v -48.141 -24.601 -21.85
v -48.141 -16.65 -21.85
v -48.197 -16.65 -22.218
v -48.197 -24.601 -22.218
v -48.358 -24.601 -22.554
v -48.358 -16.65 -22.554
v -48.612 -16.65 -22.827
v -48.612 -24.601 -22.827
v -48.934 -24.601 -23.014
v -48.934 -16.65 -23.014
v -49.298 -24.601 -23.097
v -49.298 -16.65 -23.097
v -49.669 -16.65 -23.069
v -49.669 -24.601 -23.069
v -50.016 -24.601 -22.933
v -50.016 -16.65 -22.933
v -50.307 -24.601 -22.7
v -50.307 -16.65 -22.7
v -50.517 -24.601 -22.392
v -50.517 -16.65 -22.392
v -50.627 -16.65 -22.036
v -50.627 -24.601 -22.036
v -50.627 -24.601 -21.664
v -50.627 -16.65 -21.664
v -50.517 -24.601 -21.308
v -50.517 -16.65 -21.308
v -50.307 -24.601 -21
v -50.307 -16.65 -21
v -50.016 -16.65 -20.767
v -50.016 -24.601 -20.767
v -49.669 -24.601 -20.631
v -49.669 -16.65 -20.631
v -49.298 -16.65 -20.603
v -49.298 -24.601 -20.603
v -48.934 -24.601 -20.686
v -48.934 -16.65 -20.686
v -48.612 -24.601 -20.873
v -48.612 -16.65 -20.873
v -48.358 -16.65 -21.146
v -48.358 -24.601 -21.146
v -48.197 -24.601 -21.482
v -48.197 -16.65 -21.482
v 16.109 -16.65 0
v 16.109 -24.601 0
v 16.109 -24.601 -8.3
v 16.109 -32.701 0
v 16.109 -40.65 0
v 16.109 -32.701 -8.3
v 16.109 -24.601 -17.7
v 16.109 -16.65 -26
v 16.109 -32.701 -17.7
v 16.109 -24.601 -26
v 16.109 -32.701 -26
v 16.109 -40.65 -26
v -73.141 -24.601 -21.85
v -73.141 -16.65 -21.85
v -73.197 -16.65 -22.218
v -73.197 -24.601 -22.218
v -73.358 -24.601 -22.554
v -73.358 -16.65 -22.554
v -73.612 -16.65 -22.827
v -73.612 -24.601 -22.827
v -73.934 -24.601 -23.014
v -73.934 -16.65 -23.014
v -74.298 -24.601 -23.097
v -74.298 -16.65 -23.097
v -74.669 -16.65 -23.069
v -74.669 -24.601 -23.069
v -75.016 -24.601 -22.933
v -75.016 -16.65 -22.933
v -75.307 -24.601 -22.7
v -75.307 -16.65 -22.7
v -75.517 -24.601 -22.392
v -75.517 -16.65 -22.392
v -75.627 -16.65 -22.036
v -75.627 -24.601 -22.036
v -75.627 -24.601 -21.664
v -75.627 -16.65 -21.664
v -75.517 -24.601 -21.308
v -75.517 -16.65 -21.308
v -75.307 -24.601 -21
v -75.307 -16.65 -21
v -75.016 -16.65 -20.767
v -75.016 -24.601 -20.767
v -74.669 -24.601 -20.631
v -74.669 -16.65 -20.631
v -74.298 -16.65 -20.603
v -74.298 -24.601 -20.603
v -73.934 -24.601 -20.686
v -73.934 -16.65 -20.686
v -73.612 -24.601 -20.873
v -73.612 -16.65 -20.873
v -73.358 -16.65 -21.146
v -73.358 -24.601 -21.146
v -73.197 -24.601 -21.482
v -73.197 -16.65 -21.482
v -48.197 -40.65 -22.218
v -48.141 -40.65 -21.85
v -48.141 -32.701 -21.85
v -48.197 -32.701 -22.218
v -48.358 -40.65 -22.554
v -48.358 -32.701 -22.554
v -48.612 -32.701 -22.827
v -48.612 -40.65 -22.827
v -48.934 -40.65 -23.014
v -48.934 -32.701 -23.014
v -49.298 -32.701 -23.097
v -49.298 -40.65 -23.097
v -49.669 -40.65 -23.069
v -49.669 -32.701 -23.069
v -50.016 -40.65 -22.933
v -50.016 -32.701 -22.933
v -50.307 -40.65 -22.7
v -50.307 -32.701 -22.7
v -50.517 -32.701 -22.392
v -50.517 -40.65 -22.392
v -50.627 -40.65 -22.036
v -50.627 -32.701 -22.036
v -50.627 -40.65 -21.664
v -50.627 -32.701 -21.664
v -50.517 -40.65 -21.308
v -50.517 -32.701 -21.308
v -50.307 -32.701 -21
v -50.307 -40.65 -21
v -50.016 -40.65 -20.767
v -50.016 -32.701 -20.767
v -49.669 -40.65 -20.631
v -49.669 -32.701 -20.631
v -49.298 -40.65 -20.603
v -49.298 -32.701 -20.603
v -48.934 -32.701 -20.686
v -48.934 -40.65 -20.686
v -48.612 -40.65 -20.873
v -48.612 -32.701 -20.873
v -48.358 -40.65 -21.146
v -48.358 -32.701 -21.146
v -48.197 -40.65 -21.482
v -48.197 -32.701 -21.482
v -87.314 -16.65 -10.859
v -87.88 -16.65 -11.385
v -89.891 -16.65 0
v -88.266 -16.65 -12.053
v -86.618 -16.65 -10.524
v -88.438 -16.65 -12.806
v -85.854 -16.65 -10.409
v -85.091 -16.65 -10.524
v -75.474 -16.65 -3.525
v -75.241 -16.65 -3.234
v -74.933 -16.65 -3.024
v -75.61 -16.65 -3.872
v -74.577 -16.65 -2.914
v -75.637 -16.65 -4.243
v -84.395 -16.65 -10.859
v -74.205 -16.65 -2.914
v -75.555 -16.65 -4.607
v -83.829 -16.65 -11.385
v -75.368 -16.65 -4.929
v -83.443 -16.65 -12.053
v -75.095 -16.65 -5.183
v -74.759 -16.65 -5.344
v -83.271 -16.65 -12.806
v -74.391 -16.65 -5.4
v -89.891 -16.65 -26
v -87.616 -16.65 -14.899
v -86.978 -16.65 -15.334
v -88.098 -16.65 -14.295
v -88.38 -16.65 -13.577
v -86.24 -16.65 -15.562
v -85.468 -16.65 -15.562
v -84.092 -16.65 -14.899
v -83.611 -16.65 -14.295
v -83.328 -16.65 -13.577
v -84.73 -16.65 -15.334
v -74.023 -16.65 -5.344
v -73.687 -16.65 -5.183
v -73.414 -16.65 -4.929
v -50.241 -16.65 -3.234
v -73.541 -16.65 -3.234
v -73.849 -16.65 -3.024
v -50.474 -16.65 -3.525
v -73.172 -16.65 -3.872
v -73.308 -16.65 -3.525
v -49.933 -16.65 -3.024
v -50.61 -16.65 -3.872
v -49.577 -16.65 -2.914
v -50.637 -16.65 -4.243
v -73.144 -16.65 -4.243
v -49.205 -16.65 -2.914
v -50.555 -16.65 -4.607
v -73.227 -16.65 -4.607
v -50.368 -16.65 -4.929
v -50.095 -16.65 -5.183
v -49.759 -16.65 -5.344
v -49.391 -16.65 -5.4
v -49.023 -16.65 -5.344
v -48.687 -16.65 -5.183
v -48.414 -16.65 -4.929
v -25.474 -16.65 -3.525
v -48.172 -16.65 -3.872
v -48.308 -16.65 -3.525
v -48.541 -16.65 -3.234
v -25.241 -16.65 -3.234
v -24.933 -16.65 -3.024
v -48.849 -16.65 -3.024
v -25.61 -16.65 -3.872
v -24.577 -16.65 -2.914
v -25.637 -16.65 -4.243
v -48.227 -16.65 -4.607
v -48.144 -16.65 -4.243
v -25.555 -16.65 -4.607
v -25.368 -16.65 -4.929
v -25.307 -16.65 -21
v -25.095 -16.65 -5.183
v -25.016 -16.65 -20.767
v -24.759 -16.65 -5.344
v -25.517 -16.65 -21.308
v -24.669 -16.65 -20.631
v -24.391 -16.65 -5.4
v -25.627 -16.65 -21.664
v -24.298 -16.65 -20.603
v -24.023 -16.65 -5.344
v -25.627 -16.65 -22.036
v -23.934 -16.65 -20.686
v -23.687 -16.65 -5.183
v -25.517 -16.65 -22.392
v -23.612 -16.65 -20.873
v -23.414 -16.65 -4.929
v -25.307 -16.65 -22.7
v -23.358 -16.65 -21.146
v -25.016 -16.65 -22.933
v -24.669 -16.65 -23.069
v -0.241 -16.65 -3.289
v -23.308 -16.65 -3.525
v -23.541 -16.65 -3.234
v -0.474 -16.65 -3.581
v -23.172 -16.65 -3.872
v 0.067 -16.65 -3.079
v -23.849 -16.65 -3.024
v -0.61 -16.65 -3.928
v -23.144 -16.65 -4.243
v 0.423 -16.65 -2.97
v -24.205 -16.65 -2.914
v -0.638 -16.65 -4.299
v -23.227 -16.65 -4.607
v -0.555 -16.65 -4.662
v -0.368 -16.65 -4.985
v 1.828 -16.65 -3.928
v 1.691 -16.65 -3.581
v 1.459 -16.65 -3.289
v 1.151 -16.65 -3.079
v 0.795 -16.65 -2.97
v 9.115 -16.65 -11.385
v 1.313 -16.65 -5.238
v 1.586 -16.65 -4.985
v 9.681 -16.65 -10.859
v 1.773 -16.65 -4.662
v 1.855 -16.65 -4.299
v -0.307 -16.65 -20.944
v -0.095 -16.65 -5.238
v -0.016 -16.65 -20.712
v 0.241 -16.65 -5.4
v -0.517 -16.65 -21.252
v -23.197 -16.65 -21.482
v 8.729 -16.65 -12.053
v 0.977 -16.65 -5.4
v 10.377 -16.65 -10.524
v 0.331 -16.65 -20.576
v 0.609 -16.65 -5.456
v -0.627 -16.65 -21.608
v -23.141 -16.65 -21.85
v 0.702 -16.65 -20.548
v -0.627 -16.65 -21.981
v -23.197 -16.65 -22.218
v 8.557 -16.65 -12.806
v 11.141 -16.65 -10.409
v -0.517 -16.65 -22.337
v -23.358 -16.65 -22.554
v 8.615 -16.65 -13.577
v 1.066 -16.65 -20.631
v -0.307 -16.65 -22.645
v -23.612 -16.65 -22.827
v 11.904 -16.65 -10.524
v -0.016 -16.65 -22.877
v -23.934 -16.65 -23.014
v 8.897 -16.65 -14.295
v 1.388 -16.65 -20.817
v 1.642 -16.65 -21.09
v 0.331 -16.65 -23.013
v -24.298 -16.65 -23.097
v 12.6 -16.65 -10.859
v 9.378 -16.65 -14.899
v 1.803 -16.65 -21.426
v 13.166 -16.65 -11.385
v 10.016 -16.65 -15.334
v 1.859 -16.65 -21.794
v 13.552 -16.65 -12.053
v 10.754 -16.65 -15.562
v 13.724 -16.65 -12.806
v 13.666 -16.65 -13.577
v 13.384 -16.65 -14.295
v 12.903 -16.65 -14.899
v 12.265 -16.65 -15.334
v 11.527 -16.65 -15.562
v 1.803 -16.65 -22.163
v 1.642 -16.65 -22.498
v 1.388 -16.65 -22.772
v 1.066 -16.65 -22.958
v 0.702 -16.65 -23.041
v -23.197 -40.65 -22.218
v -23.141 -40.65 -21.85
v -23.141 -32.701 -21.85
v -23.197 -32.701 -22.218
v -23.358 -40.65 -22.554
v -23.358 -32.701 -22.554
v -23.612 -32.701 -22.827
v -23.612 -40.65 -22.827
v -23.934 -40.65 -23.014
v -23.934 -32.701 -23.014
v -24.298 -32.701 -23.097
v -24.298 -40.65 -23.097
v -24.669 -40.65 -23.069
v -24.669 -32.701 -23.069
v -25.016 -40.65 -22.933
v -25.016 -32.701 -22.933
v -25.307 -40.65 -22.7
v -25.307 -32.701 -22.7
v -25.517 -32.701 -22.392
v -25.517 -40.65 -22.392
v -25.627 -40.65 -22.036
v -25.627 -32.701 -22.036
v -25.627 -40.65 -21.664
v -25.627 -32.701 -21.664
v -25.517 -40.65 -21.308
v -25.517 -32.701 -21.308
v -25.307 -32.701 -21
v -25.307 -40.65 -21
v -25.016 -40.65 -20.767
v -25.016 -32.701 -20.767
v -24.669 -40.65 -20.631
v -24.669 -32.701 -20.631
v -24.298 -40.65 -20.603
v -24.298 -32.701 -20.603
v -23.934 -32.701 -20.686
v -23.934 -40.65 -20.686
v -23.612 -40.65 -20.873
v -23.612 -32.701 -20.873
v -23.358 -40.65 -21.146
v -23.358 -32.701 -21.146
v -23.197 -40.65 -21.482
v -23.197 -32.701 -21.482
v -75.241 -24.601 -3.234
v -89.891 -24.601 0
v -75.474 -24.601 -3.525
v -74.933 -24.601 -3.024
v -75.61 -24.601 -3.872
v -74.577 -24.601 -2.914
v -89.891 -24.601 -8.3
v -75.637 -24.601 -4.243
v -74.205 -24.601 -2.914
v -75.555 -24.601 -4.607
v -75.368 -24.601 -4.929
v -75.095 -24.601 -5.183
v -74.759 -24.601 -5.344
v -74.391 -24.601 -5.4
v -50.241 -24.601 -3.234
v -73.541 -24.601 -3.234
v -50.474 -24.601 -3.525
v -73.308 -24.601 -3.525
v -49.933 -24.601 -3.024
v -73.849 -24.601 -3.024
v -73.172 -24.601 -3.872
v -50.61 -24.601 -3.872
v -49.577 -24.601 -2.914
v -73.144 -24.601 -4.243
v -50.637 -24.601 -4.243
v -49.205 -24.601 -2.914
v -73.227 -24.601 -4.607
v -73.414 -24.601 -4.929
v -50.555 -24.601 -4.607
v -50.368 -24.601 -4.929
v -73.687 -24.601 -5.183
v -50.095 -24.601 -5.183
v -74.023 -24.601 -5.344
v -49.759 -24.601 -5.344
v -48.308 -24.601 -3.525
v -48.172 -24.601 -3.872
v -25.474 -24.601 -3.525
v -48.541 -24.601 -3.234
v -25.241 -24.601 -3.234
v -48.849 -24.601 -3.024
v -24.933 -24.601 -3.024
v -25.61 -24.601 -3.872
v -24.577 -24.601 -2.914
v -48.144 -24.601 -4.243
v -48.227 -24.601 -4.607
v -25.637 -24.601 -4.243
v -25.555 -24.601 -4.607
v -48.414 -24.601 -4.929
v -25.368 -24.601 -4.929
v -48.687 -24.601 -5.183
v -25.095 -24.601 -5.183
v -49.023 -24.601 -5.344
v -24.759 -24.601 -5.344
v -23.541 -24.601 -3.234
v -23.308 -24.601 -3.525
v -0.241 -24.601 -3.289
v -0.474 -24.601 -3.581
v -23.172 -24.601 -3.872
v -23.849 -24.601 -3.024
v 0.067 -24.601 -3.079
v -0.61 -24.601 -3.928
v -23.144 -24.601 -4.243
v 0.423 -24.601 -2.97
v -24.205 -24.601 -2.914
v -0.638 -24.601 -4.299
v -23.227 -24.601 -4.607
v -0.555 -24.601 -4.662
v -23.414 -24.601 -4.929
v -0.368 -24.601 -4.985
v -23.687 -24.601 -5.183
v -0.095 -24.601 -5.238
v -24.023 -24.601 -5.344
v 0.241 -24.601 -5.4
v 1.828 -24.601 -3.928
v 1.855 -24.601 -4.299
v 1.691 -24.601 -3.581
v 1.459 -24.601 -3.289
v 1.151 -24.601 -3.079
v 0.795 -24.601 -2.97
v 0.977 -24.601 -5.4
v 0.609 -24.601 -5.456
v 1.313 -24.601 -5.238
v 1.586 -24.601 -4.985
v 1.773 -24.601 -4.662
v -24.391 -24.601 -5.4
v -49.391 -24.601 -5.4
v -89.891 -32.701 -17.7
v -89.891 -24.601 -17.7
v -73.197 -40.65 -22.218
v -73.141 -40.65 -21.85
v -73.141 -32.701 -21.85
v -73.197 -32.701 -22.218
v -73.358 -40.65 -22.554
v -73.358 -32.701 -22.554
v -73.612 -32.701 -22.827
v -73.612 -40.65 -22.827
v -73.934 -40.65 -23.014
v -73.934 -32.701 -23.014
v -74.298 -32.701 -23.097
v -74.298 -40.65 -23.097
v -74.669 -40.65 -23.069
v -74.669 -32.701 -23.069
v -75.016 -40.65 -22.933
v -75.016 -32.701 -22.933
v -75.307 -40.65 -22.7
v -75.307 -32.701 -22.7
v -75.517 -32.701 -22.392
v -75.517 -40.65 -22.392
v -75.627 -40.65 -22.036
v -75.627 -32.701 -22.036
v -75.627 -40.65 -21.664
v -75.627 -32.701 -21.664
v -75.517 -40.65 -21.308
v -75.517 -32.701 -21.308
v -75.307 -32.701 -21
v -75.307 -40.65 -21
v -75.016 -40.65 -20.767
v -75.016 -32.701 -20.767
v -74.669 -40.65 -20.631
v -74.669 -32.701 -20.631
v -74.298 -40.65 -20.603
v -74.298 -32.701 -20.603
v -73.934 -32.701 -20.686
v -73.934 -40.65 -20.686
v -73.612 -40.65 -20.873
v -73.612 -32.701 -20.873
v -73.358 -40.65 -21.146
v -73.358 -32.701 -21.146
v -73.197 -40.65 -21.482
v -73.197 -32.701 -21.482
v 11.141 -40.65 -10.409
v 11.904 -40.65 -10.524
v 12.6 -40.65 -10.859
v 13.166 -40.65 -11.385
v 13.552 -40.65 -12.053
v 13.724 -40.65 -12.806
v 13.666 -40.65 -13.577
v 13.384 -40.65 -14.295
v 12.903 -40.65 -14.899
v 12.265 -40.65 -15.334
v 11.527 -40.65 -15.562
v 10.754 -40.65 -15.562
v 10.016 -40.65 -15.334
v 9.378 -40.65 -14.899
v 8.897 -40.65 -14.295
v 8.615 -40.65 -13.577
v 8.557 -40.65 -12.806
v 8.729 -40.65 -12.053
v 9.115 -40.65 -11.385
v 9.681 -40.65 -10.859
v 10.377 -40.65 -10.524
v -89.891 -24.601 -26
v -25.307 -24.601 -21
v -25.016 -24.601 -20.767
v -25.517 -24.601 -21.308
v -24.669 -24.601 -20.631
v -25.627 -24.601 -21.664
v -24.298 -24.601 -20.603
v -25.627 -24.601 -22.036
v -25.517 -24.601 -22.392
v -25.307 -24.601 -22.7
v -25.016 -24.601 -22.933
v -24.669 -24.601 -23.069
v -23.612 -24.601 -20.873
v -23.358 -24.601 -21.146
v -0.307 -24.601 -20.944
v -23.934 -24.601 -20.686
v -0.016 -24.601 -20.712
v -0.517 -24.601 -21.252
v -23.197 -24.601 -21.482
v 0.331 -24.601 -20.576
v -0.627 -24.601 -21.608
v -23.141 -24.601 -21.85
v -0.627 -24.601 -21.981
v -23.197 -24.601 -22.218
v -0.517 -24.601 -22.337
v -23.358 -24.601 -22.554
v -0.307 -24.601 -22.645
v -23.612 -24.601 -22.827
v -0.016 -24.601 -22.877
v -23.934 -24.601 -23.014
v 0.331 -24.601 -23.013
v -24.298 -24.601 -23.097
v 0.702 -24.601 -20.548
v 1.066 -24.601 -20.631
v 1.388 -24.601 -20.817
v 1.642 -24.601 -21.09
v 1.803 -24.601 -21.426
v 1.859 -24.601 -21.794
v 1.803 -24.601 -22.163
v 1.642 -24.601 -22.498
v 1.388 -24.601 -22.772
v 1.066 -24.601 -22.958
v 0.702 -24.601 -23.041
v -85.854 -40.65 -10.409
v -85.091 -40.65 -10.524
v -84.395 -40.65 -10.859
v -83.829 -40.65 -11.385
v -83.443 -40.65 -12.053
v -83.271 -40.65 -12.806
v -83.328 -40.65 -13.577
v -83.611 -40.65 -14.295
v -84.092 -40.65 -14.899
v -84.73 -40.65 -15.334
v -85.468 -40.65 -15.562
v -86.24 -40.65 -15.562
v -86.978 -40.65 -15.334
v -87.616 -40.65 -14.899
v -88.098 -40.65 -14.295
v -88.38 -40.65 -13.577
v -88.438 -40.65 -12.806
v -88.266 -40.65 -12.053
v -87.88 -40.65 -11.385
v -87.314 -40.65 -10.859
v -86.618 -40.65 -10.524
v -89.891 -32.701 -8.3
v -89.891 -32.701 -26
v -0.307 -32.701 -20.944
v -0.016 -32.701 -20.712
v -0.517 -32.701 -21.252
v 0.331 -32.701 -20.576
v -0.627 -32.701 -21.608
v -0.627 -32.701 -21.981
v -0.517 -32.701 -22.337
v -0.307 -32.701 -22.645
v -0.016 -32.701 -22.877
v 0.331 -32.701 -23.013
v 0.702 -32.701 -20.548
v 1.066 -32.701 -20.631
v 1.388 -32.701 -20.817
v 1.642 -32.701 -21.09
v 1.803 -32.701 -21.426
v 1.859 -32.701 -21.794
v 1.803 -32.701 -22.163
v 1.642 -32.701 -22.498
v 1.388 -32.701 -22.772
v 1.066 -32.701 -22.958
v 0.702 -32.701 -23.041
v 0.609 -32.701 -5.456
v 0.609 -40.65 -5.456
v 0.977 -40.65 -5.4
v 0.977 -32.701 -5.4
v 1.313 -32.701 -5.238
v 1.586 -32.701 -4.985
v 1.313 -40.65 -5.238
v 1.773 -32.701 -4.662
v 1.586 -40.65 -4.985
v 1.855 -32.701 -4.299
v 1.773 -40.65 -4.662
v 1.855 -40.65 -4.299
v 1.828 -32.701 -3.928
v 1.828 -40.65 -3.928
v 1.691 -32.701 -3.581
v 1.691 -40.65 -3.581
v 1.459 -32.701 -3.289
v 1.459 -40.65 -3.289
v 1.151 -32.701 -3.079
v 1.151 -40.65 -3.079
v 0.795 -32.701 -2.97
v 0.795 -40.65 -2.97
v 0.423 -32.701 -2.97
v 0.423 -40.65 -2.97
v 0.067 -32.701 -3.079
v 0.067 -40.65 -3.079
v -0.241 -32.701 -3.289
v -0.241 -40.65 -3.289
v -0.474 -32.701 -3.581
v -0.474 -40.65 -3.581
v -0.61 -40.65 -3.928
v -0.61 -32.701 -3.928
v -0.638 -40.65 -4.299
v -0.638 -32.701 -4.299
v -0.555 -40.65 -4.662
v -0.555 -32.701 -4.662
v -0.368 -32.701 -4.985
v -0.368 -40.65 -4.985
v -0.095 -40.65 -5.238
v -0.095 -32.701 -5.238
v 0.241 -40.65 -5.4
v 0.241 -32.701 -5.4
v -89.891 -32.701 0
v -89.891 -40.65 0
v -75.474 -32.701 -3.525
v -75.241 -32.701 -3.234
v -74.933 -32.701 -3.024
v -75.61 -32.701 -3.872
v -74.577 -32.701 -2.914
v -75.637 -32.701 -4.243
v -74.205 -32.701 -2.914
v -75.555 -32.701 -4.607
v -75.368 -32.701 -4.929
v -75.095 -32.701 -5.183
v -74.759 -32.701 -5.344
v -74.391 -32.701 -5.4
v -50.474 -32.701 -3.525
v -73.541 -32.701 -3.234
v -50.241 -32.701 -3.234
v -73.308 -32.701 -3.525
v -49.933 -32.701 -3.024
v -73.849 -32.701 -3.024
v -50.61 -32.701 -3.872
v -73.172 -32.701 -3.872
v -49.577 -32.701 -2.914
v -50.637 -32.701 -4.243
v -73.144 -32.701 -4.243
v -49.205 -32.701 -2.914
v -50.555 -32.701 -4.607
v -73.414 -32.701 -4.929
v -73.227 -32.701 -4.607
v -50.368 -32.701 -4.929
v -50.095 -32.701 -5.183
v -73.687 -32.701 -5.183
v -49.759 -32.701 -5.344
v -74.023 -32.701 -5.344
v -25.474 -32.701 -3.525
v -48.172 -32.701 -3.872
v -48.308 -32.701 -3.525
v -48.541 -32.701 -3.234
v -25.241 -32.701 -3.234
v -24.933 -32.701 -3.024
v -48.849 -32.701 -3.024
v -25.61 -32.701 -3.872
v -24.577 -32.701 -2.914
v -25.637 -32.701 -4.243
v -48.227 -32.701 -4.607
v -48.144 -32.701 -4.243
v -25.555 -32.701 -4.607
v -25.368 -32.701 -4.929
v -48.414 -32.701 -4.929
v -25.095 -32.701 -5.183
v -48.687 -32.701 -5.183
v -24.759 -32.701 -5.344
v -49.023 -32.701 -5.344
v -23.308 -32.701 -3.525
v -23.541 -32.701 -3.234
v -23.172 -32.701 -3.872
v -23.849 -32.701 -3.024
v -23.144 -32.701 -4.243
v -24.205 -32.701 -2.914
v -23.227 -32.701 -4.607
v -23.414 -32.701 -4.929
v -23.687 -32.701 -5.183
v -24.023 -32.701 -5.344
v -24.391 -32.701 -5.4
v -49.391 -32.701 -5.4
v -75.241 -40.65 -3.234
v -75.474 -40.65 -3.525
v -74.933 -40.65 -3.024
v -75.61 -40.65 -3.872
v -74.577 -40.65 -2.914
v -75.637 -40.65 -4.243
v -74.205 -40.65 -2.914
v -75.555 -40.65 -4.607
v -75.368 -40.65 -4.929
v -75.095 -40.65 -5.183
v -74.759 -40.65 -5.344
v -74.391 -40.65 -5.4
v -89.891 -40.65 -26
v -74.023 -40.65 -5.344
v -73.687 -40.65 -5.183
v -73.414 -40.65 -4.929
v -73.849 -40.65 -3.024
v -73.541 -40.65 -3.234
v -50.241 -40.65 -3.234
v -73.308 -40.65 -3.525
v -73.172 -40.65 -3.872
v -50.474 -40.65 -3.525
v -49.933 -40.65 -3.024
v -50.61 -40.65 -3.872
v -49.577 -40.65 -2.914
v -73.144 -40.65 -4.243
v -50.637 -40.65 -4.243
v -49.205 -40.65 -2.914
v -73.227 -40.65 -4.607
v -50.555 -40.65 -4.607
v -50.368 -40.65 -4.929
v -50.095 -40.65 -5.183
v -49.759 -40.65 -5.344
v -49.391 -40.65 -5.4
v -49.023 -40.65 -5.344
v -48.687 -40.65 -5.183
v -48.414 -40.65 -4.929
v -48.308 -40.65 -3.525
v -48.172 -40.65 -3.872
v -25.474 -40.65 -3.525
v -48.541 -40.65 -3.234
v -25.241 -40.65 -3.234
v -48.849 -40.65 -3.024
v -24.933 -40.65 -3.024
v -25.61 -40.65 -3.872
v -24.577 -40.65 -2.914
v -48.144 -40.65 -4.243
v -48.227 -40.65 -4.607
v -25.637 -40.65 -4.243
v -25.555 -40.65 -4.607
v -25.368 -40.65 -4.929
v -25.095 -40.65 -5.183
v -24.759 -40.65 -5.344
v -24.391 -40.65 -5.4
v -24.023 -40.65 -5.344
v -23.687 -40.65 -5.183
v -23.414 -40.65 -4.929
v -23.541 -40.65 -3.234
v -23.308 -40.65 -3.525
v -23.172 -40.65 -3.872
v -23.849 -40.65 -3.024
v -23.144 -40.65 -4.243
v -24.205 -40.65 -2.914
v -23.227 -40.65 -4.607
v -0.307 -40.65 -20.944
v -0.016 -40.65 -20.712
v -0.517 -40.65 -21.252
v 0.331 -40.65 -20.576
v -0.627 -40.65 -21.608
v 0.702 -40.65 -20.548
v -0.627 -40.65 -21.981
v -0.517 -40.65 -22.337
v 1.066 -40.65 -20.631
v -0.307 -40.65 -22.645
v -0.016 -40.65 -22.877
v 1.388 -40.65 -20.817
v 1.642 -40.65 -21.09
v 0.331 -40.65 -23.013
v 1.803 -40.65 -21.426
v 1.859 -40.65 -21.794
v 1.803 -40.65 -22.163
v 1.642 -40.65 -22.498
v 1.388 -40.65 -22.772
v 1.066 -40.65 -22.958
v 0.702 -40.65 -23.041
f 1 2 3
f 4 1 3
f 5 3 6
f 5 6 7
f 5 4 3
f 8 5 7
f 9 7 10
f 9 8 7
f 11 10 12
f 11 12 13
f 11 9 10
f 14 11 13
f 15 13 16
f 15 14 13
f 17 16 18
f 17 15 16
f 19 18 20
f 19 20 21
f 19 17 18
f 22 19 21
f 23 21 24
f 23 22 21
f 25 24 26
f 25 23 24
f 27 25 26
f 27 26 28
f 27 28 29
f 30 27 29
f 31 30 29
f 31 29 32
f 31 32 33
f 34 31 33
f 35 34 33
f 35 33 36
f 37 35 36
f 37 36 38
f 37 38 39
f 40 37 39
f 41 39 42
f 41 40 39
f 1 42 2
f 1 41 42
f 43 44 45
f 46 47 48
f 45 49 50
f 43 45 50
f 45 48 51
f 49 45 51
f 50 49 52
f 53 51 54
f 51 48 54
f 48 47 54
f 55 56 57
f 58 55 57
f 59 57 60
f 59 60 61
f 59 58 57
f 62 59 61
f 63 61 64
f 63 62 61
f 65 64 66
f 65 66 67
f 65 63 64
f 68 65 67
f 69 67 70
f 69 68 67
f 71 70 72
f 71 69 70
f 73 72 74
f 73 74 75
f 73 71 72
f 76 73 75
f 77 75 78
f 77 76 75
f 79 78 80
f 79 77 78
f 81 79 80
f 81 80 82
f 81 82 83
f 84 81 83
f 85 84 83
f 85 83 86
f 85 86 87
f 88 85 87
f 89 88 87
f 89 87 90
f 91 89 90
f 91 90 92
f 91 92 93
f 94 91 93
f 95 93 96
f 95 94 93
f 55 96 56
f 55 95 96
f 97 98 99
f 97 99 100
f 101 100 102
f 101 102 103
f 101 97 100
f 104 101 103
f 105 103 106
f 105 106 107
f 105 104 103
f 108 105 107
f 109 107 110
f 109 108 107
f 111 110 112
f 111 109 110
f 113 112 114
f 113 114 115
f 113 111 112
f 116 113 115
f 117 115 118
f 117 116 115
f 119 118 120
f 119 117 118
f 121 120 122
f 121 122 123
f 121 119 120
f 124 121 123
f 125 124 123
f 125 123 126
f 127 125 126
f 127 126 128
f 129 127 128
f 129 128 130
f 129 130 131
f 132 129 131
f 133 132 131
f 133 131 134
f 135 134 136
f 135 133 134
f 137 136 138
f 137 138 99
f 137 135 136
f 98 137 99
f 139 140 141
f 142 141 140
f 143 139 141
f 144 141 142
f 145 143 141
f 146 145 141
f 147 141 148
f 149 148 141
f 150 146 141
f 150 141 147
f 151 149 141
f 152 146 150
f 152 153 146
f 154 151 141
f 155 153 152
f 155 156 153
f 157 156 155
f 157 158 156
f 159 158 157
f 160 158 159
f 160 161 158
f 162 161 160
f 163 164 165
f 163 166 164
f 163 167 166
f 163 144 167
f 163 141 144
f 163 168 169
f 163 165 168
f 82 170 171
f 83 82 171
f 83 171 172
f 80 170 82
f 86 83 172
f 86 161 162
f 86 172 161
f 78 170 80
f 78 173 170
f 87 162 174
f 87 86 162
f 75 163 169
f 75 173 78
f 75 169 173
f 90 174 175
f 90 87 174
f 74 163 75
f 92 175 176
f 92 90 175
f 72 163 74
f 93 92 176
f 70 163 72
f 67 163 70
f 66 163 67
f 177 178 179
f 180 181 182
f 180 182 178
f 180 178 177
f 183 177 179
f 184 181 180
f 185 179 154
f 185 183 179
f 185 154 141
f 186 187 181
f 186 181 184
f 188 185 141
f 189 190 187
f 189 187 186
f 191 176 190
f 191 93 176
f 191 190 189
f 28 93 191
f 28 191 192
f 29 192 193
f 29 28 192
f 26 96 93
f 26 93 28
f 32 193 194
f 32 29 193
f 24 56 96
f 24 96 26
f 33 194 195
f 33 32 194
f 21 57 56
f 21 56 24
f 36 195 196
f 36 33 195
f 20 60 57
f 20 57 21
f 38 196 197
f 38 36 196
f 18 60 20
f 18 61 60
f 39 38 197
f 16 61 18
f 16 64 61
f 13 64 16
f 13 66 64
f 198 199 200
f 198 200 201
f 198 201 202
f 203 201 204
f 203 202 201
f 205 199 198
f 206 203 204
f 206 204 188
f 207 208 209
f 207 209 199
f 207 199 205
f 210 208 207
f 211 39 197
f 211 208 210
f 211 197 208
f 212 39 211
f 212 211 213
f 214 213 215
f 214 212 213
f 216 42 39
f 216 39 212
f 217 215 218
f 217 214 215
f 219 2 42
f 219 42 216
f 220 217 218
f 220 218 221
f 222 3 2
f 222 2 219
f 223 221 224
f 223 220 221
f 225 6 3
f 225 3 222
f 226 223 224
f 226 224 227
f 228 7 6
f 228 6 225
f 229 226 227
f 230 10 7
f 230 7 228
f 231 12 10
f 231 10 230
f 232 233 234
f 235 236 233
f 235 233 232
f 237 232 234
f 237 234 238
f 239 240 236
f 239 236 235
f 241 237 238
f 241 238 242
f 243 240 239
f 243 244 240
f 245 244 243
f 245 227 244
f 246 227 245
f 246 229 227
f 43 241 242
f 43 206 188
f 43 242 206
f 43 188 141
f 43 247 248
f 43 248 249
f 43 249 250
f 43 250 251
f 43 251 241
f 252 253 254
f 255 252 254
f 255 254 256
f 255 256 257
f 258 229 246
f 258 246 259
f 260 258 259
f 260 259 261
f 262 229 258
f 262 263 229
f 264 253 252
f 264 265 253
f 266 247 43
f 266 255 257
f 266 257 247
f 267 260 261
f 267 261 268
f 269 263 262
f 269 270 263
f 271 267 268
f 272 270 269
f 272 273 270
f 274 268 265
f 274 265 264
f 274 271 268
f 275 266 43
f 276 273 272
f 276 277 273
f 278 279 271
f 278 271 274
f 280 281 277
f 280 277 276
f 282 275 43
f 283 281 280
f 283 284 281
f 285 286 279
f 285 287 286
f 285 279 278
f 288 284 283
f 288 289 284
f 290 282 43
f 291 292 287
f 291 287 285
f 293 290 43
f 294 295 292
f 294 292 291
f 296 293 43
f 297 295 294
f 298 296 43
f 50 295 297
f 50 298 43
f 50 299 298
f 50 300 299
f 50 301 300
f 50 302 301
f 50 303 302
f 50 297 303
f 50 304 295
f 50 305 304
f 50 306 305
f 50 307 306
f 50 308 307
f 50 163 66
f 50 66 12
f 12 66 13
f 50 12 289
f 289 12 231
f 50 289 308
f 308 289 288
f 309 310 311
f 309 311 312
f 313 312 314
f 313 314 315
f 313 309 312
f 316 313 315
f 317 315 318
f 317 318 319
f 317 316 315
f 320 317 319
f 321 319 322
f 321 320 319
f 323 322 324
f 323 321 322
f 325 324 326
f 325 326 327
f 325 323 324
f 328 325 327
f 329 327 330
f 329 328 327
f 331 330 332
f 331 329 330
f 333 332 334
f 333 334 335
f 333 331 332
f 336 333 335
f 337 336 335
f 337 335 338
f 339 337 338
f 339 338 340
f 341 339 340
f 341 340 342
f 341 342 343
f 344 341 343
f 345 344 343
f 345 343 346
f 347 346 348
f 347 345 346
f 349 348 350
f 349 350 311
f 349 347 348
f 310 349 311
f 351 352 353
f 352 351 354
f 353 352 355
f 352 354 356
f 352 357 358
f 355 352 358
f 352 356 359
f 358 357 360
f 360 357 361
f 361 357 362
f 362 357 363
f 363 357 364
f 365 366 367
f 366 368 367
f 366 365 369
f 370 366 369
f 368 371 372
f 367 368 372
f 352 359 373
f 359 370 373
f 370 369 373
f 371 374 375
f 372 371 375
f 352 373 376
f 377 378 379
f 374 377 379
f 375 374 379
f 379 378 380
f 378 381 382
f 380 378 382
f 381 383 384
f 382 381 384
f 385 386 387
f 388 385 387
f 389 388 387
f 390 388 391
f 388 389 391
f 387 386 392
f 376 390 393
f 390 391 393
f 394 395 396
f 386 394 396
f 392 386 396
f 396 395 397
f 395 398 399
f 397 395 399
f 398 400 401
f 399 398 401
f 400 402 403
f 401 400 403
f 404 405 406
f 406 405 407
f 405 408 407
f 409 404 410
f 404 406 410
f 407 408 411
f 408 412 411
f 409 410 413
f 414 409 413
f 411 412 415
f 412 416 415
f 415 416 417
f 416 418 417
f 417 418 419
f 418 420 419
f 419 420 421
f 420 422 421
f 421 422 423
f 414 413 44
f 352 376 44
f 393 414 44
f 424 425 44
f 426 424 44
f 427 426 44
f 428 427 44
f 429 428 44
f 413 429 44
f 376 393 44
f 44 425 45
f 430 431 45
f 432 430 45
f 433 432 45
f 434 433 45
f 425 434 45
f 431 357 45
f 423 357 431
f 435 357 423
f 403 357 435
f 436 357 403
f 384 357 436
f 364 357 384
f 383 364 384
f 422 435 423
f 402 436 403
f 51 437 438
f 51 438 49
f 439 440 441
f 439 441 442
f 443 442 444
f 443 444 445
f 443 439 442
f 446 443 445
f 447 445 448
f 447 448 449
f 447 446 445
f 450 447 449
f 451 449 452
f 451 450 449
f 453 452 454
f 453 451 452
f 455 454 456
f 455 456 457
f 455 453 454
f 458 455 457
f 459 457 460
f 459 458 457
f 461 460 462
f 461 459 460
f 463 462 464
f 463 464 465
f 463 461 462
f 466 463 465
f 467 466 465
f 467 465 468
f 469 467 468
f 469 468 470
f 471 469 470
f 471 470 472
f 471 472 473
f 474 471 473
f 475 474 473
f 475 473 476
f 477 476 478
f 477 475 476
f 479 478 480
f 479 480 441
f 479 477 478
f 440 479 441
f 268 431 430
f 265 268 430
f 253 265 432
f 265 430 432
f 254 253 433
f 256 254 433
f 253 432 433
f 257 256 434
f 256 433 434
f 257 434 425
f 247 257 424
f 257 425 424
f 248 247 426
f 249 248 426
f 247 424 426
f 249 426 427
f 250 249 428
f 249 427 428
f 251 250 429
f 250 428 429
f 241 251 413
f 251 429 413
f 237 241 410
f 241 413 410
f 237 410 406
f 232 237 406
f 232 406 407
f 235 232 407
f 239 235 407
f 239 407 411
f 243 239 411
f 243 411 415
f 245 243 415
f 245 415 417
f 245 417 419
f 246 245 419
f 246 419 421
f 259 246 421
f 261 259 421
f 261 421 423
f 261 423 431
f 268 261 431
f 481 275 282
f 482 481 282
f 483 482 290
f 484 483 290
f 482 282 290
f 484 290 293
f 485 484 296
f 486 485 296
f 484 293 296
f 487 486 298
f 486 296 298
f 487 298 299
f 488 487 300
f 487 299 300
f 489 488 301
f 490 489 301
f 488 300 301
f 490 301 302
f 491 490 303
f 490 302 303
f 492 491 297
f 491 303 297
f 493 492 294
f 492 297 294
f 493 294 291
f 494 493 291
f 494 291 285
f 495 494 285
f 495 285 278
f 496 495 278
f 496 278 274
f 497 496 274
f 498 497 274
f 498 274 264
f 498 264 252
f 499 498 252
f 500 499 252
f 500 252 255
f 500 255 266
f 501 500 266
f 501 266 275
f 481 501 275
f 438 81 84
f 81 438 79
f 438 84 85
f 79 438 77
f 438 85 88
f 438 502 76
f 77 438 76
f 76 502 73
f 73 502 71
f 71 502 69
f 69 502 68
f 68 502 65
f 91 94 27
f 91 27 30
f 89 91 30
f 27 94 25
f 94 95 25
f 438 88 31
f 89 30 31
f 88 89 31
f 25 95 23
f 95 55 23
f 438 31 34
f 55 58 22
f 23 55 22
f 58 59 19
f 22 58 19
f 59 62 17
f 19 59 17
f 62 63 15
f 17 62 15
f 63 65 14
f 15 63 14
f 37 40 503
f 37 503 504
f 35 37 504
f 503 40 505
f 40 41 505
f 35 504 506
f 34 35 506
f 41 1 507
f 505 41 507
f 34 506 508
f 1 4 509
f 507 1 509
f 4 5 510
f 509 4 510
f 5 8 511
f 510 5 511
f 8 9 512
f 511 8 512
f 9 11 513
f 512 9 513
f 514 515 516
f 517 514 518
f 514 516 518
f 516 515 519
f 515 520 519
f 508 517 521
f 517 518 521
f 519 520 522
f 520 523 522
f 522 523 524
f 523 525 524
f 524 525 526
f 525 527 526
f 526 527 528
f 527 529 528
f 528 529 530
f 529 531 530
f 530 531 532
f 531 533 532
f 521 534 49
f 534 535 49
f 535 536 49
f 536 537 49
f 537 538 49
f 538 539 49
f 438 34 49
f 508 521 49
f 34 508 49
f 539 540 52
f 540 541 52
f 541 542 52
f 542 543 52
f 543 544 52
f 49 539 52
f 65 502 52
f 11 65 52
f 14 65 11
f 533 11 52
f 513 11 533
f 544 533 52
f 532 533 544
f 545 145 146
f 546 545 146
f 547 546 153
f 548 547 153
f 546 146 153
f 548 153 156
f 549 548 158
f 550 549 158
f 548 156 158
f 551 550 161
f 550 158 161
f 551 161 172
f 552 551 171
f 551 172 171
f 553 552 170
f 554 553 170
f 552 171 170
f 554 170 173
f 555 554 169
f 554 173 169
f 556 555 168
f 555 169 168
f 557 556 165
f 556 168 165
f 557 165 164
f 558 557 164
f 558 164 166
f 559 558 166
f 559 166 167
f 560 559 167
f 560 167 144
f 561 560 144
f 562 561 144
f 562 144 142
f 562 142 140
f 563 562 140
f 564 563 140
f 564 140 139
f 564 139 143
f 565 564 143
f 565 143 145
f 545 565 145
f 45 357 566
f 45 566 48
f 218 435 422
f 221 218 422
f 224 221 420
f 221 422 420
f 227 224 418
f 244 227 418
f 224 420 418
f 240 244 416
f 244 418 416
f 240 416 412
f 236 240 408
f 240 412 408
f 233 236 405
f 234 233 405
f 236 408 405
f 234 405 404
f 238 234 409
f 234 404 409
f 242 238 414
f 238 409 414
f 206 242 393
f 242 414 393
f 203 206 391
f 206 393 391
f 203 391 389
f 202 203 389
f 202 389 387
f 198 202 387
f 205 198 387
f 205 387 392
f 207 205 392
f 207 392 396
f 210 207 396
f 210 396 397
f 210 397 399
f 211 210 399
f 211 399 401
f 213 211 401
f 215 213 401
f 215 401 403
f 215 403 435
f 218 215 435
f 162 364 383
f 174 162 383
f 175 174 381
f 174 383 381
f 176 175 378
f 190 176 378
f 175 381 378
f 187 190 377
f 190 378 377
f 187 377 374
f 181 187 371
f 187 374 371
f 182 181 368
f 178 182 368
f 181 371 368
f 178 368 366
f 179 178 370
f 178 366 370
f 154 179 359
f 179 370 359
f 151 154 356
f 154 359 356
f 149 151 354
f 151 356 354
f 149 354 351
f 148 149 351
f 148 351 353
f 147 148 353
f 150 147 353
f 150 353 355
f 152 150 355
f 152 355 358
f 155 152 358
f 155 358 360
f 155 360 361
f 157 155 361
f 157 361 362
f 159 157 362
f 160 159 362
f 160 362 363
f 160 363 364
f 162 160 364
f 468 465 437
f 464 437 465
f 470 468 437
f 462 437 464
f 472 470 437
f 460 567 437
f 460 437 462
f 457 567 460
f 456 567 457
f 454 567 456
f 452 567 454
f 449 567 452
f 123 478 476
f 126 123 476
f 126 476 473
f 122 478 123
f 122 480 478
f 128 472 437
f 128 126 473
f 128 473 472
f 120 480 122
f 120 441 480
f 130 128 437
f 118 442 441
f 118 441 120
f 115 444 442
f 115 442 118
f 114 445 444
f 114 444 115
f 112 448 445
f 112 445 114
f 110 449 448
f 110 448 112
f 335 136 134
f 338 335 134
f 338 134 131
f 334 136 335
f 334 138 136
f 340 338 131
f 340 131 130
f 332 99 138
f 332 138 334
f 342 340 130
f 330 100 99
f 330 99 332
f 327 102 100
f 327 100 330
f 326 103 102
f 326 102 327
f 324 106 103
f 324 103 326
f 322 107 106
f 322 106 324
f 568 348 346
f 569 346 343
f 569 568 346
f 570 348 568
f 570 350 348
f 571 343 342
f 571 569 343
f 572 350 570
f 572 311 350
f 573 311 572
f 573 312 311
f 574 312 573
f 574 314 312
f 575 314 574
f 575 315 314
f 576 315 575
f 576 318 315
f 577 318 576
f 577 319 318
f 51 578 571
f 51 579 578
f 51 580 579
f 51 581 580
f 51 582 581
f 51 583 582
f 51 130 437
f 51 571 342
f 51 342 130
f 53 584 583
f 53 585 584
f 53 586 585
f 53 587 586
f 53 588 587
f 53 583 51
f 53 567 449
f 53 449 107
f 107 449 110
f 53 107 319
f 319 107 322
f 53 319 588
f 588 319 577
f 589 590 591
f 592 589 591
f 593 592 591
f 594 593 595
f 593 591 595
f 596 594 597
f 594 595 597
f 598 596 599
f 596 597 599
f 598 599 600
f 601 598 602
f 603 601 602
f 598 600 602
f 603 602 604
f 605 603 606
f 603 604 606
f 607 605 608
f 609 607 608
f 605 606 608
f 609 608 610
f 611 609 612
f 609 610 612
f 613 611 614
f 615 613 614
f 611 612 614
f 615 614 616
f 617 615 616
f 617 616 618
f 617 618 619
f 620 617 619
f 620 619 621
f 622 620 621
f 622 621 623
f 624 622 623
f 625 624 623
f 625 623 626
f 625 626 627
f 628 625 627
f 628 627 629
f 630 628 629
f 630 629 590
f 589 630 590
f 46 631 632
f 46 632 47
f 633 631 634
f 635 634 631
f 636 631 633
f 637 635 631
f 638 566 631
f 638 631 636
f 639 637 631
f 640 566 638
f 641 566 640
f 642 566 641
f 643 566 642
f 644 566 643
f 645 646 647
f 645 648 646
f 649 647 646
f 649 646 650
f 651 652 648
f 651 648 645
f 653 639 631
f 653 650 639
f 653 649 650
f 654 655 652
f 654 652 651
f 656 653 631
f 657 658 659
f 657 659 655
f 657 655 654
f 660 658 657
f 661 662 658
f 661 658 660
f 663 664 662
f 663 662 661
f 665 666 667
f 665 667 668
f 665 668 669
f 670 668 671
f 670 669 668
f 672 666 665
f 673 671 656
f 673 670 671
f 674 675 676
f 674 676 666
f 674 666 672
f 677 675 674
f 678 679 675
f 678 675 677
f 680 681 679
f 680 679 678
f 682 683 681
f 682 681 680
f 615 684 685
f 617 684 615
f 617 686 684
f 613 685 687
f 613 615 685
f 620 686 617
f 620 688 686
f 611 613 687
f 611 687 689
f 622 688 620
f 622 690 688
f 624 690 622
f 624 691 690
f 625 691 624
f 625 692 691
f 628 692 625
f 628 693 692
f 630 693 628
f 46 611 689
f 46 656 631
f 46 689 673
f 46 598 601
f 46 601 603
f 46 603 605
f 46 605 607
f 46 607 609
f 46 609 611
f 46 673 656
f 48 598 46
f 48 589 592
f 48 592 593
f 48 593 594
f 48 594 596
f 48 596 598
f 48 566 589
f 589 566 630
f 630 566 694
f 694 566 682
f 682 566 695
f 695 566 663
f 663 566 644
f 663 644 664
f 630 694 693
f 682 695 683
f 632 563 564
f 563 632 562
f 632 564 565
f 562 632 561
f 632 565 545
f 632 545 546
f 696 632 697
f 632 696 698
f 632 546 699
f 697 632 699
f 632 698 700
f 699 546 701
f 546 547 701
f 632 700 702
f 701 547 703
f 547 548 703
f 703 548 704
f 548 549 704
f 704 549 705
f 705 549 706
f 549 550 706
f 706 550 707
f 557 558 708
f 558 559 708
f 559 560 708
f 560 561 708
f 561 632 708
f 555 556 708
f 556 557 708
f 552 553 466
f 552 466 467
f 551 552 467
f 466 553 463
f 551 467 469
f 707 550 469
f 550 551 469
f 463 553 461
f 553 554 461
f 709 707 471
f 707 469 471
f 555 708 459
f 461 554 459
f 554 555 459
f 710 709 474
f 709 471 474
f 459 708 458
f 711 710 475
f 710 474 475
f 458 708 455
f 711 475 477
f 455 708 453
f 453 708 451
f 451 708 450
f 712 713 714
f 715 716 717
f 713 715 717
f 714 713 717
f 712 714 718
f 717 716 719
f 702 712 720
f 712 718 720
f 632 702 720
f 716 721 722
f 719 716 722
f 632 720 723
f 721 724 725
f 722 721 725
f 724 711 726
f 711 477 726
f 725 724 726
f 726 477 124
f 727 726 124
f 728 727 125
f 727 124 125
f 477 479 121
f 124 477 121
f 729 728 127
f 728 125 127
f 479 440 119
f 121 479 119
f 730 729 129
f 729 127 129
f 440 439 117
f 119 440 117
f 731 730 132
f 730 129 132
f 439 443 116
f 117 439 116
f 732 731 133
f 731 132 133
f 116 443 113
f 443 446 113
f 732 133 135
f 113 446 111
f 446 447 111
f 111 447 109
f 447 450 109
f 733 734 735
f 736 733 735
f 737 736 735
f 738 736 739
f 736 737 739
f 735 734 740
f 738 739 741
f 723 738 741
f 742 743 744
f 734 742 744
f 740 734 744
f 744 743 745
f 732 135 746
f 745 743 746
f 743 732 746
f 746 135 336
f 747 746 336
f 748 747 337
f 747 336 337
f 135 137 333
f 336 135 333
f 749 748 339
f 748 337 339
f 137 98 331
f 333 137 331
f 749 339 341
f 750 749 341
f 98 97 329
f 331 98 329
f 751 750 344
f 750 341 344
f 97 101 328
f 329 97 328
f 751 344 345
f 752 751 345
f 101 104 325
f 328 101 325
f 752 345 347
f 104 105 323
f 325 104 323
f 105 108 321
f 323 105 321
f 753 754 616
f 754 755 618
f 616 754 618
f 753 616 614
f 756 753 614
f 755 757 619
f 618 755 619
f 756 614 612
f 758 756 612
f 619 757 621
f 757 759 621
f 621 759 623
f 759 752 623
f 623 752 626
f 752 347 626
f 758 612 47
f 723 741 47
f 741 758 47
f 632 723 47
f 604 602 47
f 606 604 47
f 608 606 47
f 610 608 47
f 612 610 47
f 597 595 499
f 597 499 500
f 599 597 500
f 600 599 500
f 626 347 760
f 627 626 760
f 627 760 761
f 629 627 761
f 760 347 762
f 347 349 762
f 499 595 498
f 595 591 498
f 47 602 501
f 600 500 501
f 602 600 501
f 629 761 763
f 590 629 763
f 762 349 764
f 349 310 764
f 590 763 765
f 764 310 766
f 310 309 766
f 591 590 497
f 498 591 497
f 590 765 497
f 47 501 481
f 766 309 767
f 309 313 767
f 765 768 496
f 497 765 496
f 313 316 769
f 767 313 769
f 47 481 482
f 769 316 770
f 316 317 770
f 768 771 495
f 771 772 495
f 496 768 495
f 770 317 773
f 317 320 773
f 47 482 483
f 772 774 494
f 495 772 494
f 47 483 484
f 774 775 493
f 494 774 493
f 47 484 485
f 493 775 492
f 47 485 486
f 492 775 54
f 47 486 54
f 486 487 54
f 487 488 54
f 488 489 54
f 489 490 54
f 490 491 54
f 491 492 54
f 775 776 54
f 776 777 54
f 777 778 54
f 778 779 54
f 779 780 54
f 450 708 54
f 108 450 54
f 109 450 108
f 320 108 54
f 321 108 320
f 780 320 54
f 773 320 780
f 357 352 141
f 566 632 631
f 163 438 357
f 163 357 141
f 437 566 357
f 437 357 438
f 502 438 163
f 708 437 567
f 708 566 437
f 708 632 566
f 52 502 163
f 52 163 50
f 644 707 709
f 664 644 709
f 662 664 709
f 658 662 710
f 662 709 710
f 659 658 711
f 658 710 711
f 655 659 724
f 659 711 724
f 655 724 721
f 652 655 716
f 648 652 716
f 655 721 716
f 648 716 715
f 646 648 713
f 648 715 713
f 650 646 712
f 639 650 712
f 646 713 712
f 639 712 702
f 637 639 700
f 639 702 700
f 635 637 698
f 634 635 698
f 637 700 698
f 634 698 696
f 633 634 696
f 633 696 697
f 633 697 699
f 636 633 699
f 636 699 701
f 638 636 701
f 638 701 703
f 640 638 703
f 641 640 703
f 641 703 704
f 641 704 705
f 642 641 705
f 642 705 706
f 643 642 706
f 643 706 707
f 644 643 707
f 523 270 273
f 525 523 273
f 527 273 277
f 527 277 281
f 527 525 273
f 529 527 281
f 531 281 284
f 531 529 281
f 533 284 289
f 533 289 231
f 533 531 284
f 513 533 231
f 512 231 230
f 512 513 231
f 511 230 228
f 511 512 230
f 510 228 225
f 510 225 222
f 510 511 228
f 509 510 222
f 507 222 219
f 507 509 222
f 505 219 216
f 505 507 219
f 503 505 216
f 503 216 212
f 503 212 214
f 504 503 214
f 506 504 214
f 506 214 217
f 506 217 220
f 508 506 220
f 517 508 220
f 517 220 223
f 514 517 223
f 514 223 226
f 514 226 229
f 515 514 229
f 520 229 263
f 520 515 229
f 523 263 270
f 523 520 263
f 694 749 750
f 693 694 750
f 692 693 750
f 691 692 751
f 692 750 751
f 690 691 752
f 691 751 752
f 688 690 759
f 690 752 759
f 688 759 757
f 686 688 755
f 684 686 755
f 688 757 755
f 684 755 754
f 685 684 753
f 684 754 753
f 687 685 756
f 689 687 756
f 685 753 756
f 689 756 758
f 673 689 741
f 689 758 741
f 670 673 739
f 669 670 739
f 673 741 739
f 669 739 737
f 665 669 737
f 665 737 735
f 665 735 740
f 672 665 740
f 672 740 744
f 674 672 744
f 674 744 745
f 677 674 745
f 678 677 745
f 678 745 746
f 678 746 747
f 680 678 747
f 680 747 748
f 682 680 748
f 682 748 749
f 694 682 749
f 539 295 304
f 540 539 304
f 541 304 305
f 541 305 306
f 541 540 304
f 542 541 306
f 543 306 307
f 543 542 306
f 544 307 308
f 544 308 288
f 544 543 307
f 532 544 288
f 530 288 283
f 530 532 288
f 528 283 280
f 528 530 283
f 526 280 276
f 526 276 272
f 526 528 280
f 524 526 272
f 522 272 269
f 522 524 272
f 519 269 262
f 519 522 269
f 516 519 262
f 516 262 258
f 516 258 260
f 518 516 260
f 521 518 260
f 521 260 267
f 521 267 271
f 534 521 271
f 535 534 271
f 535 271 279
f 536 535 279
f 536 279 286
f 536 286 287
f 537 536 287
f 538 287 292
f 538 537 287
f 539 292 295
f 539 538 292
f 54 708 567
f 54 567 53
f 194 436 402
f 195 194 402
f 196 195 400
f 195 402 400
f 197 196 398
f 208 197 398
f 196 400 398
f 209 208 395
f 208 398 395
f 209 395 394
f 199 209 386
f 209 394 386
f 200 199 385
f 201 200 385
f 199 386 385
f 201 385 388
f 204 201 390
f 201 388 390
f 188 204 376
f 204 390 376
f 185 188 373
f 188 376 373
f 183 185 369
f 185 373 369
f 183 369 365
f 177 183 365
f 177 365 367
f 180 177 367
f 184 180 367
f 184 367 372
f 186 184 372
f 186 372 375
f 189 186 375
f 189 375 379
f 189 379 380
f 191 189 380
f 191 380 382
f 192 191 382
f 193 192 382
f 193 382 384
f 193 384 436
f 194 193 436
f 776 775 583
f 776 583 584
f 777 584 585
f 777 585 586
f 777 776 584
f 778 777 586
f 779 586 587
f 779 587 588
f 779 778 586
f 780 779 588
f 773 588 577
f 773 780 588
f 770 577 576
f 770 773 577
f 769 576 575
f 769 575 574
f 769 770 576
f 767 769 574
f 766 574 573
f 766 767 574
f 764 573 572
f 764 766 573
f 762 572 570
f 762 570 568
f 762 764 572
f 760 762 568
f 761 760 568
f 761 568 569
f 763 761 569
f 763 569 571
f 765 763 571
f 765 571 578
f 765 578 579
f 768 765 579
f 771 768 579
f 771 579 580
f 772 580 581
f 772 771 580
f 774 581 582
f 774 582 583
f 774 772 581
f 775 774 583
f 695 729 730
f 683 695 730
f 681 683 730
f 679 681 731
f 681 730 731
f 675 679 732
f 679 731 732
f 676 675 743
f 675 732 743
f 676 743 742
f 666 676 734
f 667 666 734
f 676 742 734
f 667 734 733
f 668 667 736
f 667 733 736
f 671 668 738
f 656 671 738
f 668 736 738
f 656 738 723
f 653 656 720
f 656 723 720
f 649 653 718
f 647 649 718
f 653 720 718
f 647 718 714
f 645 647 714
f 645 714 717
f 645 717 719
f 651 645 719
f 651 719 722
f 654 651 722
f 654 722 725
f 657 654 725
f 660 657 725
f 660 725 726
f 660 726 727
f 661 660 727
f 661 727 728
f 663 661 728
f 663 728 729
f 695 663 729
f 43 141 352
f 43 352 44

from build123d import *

# Parameters (mm, degrees)
SKETCH4_W                  = 106
SKETCH4_H                  = 24
BOSS_EXTRUDE2_DEPTH        = 13
CUT_EXTRUDE3_START         = -8.3
SKETCH25_W                 = 106
SKETCH25_H                 = 8.1
CUT_EXTRUDE3_DEPTH         = 108.807903902
M3X0_5_TAPPED_HOLE1_D      = 2.5
MIRROR3_START              = -40.65
MIRROR3_OUTLINE_W          = 106
MIRROR3_OUTLINE_H          = 4.7
MIRROR3_DEPTH              = 24
MIRROR3_START_2            = -24.601316976
MIRROR3_2_OUTLINE_W        = 106
MIRROR3_2_OUTLINE_H        = 8.3
MIRROR3_2_OUTLINE_R        = 1.25
MIRROR3_2_DEPTH            = 7.951316976
MIRROR3_3_OUTLINE_W        = 106
MIRROR3_3_OUTLINE_H        = 8.3
MIRROR3_3_OUTLINE_R        = 1.25
MIRROR3_3_DEPTH            = 7.948683024
F_6_0_204_DIAMETER_HOLE1_D = 5.1816


# Read off the part's stored shape, not the designer's step: Mirror3
with BuildPart() as part:
    # Sketch4 → Boss-Extrude2 (new body)
    with BuildSketch(Plane.XY):
        with Locations((-36.891047602, -28.65)):
            Rectangle(SKETCH4_W, SKETCH4_H)
    extrude(amount=-BOSS_EXTRUDE2_DEPTH)

    # Sketch25 → Cut-Extrude3 (cut)
    with BuildSketch(Plane.XY.offset(CUT_EXTRUDE3_START)):
        with Locations((-36.891047602, -28.651316976)):
            Rectangle(SKETCH25_W, SKETCH25_H)
    extrude(amount=CUT_EXTRUDE3_DEPTH, mode=Mode.SUBTRACT)

    # M3x0.5 Tapped Hole1 (through all)
    with Locations(Plane(origin=(-74.390985602, -16.65, -4.15), x_dir=(0, 0, 1), z_dir=(0, 1, 0))):
        with Locations((0, 0), (0, 25), (-0.055677319, 74.999938), (0, 50)):
            Hole(M3X0_5_TAPPED_HOLE1_D / 2)

    # Mirror3 outline → Mirror3 (add)
    with BuildSketch(Plane(origin=(0, 0, 0), x_dir=(1, 0, 0), z_dir=(0, 1, 0)).offset(MIRROR3_START)):
        with Locations((-36.891047602, 15.35)):
            Rectangle(MIRROR3_OUTLINE_W, MIRROR3_OUTLINE_H)
    extrude(amount=MIRROR3_DEPTH)

    # Mirror3 2 outline → Mirror3 2 (add)
    with BuildSketch(Plane(origin=(0, 0, 0), x_dir=(1, 0, 0), z_dir=(0, 1, 0)).offset(MIRROR3_START_2)):
        with Locations((-36.891047602, 21.85)):
            Rectangle(MIRROR3_2_OUTLINE_W, MIRROR3_2_OUTLINE_H)
        with Locations((-74.390985602, 21.85)):
            Circle(MIRROR3_2_OUTLINE_R, mode=Mode.SUBTRACT)
        with Locations((-49.390985602, 21.85)):
            Circle(MIRROR3_2_OUTLINE_R, mode=Mode.SUBTRACT)
        with Locations((-24.390985602, 21.85)):
            Circle(MIRROR3_2_OUTLINE_R, mode=Mode.SUBTRACT)
        with Locations((0.608952398, 21.794322681)):
            Circle(MIRROR3_2_OUTLINE_R, mode=Mode.SUBTRACT)
    extrude(amount=MIRROR3_2_DEPTH)

    # Mirror3 3 outline → Mirror3 3 (add)
    with BuildSketch(Plane(origin=(0, 0, 0), x_dir=(1, 0, 0), z_dir=(0, 1, 0)).offset(MIRROR3_START)):
        with Locations((-36.891047602, 21.85)):
            Rectangle(MIRROR3_3_OUTLINE_W, MIRROR3_3_OUTLINE_H)
        with Locations((-74.390985602, 21.85)):
            Circle(MIRROR3_3_OUTLINE_R, mode=Mode.SUBTRACT)
        with Locations((-49.390985602, 21.85)):
            Circle(MIRROR3_3_OUTLINE_R, mode=Mode.SUBTRACT)
        with Locations((-24.390985602, 21.85)):
            Circle(MIRROR3_3_OUTLINE_R, mode=Mode.SUBTRACT)
        with Locations((0.608952398, 21.794322681)):
            Circle(MIRROR3_3_OUTLINE_R, mode=Mode.SUBTRACT)
    extrude(amount=MIRROR3_3_DEPTH)

    # #6 (0.204) Diameter Hole1 (through all)
    with Locations(Plane(origin=(11.140604923, -40.65, -13), x_dir=(0, 0, -1), z_dir=(0, -1, 0))):
        with Locations((0, 0), (0, -96.994839557)):
            Hole(F_6_0_204_DIAMETER_HOLE1_D / 2)


solid = part.part
